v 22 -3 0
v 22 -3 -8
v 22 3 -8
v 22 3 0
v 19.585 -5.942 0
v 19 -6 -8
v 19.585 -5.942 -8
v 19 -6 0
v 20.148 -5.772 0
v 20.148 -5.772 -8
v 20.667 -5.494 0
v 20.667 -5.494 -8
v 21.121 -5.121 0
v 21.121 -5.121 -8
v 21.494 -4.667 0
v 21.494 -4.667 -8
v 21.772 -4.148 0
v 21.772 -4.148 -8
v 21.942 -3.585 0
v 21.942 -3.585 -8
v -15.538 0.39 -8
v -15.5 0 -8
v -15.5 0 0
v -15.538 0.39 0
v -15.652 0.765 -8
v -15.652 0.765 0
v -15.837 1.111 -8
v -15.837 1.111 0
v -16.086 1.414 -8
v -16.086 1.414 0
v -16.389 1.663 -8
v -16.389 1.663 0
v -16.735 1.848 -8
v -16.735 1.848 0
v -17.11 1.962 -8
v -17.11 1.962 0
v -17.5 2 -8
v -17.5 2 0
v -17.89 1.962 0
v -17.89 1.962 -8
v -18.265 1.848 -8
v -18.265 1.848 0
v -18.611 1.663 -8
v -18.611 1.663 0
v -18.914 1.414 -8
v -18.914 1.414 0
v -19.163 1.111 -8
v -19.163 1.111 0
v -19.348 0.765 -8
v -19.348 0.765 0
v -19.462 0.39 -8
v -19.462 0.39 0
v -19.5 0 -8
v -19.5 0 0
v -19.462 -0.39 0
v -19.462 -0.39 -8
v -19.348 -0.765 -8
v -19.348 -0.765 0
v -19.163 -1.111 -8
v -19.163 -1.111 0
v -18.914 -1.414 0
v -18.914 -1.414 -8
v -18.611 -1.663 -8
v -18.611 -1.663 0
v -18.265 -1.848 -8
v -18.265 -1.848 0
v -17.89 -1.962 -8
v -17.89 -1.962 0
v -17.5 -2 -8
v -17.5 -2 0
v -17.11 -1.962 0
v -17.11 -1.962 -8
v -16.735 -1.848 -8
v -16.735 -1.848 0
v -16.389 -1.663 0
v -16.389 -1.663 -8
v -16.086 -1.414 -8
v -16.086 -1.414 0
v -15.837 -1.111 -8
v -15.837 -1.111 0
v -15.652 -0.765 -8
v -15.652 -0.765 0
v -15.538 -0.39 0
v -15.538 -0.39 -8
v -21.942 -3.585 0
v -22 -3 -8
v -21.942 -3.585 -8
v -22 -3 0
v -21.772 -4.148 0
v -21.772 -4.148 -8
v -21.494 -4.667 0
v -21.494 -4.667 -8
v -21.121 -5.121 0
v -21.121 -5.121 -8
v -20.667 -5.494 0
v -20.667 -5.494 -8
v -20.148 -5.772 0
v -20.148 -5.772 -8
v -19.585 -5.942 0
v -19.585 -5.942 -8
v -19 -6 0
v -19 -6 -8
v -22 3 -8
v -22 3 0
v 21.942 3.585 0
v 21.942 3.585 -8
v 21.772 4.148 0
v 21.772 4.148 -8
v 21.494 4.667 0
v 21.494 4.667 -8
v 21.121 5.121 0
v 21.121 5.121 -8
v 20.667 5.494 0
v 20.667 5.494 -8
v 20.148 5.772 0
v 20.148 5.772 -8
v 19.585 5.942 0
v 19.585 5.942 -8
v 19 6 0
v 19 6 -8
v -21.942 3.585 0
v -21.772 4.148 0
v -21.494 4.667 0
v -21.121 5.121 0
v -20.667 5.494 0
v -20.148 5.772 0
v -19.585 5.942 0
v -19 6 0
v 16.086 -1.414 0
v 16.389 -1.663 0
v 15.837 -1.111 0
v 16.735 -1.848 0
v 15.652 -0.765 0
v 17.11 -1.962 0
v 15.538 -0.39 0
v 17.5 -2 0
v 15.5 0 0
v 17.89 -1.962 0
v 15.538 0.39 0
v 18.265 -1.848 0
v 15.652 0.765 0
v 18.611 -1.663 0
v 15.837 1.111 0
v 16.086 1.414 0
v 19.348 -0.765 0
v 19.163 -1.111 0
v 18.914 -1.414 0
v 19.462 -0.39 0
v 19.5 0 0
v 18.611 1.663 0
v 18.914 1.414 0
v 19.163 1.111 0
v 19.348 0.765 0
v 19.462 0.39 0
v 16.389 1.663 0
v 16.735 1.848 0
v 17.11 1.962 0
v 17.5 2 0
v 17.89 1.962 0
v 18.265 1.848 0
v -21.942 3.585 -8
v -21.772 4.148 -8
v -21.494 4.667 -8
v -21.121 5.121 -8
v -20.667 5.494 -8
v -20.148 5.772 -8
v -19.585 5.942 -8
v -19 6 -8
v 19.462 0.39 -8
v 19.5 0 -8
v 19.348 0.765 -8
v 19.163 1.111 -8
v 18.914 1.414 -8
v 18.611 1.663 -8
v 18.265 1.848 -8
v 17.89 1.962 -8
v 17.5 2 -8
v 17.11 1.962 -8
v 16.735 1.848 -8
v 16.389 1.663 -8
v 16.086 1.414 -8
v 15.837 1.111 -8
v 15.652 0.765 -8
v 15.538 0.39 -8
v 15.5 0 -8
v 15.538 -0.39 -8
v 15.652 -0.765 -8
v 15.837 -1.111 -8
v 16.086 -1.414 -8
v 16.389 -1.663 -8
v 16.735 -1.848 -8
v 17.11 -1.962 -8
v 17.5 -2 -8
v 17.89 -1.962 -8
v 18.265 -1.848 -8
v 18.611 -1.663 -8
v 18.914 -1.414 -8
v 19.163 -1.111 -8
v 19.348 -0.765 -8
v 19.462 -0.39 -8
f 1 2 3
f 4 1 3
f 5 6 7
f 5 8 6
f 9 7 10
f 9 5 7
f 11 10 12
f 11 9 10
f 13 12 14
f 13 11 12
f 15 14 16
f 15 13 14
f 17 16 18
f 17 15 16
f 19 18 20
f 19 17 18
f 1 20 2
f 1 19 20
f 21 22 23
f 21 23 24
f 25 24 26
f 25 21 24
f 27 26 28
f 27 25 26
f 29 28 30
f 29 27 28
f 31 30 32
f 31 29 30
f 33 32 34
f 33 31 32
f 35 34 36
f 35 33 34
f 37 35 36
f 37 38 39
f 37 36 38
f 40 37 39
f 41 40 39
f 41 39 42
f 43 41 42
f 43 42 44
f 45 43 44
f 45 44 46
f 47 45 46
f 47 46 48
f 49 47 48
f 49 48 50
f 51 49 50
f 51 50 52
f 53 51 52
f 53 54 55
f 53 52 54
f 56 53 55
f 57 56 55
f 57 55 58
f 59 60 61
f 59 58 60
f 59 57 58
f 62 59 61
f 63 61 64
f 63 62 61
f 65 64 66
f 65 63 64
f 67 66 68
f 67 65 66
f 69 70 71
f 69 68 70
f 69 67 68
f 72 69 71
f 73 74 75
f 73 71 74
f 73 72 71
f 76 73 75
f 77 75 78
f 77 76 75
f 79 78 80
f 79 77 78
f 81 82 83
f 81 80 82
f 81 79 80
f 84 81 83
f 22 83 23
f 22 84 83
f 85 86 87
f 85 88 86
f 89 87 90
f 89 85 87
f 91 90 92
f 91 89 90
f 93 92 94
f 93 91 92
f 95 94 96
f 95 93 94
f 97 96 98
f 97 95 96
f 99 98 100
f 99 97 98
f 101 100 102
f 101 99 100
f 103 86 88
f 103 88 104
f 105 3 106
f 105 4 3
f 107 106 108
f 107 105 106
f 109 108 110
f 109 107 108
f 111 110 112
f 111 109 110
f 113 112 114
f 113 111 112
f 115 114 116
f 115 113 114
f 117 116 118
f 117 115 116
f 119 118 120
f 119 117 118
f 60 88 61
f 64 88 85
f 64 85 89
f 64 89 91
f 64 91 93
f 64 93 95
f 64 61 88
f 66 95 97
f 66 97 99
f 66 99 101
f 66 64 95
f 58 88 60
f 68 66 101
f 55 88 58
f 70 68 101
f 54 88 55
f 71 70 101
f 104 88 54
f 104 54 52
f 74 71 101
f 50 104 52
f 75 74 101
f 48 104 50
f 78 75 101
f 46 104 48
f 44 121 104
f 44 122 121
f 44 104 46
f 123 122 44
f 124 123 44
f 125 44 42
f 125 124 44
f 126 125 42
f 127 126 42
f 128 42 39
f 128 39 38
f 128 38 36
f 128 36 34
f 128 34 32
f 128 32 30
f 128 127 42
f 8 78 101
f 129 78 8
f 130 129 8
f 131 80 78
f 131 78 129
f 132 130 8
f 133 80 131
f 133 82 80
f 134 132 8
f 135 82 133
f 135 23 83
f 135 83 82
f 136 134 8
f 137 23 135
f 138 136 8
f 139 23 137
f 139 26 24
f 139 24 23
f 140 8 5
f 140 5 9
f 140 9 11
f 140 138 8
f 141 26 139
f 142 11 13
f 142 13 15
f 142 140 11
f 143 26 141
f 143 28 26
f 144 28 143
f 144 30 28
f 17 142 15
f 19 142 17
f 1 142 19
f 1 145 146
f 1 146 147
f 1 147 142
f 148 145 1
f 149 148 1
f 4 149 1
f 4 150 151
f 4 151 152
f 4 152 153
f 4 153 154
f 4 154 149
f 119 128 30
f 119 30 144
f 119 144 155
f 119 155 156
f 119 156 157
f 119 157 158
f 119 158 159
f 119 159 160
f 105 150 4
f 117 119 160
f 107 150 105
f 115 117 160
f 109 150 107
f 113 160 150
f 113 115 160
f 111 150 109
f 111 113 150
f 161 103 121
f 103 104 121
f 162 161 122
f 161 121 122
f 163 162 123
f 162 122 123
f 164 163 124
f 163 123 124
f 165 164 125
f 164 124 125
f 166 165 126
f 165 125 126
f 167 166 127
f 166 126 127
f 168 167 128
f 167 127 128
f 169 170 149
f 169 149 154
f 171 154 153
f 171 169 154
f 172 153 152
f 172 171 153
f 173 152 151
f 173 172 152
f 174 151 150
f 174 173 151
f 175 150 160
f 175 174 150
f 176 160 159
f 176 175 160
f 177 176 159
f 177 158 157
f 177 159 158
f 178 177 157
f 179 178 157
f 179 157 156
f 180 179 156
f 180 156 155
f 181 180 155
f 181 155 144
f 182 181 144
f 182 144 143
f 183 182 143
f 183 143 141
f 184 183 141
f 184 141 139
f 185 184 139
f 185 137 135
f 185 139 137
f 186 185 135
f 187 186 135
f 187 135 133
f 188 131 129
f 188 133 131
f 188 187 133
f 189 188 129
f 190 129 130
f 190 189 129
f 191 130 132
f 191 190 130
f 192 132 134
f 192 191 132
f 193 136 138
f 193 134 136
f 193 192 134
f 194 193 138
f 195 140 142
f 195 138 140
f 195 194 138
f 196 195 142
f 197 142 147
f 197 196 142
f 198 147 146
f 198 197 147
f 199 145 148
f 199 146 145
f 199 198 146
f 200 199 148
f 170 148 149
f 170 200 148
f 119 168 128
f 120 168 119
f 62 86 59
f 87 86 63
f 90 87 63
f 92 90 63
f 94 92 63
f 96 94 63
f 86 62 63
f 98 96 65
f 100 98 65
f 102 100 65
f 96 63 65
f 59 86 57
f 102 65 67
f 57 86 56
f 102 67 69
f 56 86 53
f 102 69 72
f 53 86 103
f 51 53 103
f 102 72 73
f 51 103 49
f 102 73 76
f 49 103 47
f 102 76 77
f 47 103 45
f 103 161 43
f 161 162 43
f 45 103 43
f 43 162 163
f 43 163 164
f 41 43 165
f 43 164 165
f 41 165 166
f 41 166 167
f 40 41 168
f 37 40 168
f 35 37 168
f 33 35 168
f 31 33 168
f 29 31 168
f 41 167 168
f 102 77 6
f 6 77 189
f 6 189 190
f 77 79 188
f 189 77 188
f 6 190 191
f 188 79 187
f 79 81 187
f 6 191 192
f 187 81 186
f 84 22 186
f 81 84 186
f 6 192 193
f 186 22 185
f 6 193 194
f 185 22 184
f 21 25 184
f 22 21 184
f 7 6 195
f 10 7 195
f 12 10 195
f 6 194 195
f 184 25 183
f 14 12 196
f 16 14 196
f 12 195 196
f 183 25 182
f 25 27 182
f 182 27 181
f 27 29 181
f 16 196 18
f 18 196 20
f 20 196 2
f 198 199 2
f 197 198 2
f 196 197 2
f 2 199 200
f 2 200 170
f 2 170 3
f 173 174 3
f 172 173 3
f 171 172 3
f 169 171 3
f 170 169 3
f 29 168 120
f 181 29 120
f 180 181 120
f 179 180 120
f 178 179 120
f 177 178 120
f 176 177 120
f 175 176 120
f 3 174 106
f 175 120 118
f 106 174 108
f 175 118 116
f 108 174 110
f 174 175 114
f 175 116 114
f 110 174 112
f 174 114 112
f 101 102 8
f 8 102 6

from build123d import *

# Parameters (mm, degrees)
CYLINDER_R     = 2
CYLINDER_DEPTH = 15
ARRAY_X_COUNT  = 2
ARRAY_X_PITCH  = 35
BOX_W          = 44
BOX_H          = 12
BOX_DEPTH      = 8
FILLET003_R    = 3


with BuildPart() as array:
    # Cylinder → Cylinder (new body)
    with BuildSketch(Plane(origin=(-17.5, 0, -10), x_dir=(1, 0, 0), z_dir=(0, 0, 1))):
        Circle(CYLINDER_R)
    extrude(amount=CYLINDER_DEPTH)

    # Array X: Array ×2


with BuildPart() as array_1:
    add(array.part)
    with Locations(*[(i * ARRAY_X_PITCH, 0, 0) for i in range(1, ARRAY_X_COUNT)]):
        add(array.part)


with BuildPart() as cut:
    # Box → Box (new body)
    with BuildSketch(Plane(origin=(-22, -6, -8), x_dir=(1, 0, 0), z_dir=(0, 0, 1))):
        with Locations((22, 6)):
            Rectangle(BOX_W, BOX_H)
    extrude(amount=BOX_DEPTH)

    # Fillet003
    fillet003_edges = [cut.edges().sort_by_distance(p)[0] for p in [
        (-22, -6, -4),
        (-22, 6, -4),
        (22, -6, -4),
        (22, 6, -4),
    ]]
    fillet(fillet003_edges, radius=FILLET003_R)

    # Cut: cut Array
    add(array_1.part, mode=Mode.SUBTRACT)


solid = cut.part
